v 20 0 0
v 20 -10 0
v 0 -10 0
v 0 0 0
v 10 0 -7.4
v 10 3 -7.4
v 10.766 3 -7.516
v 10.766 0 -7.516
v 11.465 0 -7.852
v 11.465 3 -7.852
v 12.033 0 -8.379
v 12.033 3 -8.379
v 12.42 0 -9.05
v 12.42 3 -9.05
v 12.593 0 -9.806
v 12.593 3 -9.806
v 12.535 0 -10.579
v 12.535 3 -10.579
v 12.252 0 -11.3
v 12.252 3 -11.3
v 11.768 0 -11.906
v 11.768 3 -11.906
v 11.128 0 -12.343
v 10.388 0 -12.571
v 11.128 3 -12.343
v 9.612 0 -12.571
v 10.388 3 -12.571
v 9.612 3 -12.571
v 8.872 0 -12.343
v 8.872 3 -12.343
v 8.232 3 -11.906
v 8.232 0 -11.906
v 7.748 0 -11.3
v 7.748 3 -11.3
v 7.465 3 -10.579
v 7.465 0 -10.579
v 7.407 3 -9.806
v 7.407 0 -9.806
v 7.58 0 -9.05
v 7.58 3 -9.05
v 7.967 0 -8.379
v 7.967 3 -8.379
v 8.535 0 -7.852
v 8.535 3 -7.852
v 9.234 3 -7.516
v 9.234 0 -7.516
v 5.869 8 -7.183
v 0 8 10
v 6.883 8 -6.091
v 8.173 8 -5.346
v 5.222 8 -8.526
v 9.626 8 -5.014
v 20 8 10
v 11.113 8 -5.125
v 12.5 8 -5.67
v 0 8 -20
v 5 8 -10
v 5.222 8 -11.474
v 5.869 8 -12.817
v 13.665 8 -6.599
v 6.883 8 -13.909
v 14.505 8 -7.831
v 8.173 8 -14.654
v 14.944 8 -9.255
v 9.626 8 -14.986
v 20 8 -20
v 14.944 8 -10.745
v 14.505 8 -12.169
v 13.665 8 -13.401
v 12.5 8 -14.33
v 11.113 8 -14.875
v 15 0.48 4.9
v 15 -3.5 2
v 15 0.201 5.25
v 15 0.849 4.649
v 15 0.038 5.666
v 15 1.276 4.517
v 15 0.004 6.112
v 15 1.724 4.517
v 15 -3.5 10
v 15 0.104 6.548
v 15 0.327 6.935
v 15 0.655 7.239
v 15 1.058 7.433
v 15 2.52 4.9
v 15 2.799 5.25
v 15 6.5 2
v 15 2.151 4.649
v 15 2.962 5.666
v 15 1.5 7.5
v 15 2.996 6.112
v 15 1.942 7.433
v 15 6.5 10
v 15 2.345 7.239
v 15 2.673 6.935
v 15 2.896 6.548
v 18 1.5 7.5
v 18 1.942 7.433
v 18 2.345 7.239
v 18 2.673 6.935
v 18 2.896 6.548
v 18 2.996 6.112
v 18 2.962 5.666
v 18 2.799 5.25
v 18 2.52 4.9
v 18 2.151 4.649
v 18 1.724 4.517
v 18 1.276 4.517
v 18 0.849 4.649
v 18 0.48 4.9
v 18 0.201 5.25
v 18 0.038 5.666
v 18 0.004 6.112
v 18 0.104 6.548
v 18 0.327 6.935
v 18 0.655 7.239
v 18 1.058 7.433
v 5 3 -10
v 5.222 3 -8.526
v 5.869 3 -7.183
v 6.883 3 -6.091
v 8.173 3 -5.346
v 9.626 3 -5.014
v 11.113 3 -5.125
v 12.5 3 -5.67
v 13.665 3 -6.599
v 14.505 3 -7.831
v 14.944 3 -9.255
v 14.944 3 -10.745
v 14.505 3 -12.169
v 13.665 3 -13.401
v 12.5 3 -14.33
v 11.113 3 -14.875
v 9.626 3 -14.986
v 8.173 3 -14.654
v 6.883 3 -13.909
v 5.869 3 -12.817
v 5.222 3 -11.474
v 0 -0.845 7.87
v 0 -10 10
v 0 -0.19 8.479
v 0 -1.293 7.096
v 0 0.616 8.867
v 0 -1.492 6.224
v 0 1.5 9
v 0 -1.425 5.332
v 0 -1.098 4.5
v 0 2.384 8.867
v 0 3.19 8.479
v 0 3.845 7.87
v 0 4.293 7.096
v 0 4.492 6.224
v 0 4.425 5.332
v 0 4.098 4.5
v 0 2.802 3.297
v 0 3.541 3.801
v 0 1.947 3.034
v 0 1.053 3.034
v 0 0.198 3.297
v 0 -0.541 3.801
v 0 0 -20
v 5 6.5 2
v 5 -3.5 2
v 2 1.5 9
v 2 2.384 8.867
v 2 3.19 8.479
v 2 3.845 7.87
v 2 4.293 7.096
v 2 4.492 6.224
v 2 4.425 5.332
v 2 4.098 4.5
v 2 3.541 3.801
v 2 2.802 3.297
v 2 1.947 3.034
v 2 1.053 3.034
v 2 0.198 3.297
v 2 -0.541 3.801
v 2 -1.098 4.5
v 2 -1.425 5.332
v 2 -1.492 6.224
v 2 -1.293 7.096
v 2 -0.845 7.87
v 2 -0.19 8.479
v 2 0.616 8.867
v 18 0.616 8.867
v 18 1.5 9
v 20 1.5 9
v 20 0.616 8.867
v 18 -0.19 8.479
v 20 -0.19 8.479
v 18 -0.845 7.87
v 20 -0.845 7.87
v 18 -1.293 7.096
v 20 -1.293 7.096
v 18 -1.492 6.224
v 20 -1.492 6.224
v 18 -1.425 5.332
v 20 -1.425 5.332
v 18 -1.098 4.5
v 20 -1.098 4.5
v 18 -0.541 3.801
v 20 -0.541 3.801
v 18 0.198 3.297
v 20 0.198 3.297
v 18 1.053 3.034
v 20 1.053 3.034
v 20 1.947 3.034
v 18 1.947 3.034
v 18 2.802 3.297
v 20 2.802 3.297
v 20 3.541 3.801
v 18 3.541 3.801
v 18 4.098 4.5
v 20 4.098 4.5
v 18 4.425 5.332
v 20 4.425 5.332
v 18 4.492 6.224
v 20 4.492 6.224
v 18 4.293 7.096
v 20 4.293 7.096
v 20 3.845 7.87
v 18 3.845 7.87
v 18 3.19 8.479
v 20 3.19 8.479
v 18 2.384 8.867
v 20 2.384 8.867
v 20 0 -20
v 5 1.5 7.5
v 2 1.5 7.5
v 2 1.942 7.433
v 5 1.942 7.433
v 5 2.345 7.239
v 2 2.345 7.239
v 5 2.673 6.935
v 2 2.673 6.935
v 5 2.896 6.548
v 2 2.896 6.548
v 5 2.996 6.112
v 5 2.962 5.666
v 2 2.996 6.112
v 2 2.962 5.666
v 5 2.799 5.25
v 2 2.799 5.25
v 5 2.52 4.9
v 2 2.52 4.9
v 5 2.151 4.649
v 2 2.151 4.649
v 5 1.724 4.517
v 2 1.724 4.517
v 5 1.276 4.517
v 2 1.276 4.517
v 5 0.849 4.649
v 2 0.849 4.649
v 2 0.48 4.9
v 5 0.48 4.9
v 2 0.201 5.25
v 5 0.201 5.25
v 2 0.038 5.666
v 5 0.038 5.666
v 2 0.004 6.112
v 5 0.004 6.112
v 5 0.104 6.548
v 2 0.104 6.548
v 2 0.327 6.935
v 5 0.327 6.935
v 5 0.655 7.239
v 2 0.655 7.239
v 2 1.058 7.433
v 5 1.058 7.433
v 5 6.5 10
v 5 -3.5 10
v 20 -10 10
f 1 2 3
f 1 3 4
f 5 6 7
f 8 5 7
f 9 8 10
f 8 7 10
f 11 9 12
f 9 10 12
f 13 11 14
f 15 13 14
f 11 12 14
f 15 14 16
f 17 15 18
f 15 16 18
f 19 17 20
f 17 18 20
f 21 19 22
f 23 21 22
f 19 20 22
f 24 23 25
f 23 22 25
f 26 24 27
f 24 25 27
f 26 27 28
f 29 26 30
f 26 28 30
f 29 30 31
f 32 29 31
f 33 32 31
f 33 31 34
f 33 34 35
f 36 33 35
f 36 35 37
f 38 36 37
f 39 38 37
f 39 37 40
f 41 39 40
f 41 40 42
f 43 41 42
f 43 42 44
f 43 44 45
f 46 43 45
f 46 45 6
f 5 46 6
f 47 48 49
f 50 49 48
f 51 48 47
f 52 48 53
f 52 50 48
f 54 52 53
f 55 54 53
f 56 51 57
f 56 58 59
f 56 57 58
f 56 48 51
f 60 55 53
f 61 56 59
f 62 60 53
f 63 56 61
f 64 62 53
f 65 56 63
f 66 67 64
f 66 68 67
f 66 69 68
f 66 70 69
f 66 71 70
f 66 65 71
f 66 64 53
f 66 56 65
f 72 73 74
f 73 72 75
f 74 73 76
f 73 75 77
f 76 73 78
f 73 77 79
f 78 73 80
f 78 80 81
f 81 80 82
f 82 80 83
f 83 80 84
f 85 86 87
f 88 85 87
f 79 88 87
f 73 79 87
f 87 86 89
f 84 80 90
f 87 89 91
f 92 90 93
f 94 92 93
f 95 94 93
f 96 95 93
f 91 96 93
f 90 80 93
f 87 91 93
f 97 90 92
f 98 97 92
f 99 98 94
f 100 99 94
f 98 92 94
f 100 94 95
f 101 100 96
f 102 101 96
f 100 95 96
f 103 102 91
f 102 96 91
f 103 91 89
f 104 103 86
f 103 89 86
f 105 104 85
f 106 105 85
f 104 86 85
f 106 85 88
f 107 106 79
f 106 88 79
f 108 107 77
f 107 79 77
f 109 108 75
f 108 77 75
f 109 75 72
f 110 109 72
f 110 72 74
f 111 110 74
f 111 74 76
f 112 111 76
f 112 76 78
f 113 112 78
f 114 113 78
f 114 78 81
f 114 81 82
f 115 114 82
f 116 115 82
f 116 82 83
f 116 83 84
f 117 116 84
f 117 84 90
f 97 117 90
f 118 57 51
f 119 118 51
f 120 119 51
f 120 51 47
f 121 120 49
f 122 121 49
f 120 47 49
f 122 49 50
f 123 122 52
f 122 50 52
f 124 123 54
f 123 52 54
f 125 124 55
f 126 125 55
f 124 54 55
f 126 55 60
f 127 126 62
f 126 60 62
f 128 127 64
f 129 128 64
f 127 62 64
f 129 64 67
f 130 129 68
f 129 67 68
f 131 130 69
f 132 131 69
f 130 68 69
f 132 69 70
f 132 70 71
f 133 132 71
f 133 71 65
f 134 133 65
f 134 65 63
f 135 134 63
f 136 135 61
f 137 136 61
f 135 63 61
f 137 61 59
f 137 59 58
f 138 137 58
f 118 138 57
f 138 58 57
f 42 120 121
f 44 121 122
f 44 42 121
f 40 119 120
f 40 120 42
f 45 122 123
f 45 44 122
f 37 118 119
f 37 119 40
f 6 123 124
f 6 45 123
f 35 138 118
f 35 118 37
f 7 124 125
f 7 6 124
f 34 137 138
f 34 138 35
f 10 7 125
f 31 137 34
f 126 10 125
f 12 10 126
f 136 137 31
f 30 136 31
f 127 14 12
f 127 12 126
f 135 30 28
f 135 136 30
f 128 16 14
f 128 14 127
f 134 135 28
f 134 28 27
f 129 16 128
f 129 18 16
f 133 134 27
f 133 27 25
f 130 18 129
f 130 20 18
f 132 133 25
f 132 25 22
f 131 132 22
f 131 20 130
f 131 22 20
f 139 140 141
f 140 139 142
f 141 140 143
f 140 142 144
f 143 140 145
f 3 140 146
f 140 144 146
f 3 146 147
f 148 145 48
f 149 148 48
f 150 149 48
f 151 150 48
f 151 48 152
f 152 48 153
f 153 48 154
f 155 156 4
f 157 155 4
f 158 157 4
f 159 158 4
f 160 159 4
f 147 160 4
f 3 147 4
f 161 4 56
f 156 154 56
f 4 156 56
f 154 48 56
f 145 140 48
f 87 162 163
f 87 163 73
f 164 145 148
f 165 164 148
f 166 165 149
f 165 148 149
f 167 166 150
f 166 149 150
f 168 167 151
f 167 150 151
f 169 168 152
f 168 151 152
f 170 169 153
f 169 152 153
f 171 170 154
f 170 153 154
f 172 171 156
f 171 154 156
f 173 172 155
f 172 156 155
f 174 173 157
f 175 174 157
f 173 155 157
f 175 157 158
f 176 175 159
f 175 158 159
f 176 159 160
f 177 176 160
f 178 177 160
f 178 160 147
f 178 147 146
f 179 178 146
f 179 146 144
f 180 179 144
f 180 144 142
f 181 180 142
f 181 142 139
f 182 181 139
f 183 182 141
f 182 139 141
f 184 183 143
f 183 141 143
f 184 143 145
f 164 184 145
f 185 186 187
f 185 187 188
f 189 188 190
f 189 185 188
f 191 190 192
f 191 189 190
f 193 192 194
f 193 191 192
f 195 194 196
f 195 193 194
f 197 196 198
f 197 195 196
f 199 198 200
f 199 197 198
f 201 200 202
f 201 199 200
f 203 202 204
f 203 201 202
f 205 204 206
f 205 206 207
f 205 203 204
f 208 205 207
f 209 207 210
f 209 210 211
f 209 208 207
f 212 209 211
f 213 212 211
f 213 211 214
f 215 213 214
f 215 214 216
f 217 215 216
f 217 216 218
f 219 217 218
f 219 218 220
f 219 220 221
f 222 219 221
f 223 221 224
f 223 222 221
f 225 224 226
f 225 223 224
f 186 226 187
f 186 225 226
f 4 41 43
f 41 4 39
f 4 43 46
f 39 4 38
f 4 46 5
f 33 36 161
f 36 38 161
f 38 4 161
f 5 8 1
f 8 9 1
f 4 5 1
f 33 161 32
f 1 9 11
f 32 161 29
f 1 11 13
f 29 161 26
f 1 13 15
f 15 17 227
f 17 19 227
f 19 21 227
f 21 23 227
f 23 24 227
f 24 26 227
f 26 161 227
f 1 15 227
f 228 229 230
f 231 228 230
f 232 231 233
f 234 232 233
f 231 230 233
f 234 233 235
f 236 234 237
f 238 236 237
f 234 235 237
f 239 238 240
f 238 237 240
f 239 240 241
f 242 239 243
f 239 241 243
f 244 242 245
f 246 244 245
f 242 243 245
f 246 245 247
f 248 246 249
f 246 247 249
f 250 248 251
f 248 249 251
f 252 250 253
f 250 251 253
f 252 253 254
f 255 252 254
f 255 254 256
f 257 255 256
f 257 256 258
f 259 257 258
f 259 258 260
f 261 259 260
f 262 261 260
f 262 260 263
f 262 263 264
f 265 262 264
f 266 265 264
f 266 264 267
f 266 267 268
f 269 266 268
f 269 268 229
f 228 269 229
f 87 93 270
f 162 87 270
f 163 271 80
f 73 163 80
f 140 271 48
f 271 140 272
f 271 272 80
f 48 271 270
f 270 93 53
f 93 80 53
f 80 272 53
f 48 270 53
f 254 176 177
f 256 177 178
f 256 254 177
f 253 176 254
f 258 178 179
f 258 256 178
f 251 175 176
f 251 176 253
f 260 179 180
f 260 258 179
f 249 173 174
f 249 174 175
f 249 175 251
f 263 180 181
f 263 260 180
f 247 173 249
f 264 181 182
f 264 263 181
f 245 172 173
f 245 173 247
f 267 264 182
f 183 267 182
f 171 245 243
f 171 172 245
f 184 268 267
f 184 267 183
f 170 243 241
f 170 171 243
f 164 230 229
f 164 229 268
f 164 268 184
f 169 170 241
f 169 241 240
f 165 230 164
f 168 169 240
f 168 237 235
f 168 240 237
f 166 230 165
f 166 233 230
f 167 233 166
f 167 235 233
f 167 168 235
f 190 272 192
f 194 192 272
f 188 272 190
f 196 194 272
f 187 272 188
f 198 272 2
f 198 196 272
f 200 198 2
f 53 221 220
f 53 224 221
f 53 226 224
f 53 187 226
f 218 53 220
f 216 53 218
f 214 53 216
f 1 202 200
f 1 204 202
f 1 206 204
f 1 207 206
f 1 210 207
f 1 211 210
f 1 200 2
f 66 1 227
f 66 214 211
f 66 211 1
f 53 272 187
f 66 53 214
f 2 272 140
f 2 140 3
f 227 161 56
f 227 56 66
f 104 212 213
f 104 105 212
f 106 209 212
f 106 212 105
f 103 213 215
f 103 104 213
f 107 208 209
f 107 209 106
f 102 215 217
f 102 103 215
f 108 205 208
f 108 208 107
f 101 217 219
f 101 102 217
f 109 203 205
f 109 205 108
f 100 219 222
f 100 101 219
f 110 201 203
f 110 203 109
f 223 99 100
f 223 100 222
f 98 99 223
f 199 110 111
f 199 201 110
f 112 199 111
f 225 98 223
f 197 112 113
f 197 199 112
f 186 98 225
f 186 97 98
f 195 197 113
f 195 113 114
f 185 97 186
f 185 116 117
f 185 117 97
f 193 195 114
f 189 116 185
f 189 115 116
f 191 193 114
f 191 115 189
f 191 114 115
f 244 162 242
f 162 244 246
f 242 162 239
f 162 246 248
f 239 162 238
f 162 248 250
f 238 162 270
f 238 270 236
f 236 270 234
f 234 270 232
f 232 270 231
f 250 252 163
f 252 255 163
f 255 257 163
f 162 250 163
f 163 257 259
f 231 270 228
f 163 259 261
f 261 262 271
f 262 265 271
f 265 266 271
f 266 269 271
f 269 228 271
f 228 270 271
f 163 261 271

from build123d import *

# Parameters (mm, degrees)
SKETCH_1_W          = 20
SKETCH_1_H          = 20
EXTRUDE_1_DEPTH     = 8
EXTRUDE_2_DEPTH     = 20
SKETCH_3_W          = 4
SKETCH_3_H          = 13
EXTRUDE_3_DEPTH     = 20
CUT_EXTRUDE_1_DEPTH = 5
SKETCH_5_R          = 2.6
CUT_EXTRUDE_2_DEPTH = 13
EXTRUDE_4_DEPTH     = 20
SKETCH_9_W          = 20
SKETCH_9_H          = 13
SKETCH_9_W_2        = 10
SKETCH_9_H_2        = 10
EXTRUDE_5_DEPTH     = 26
SKETCH_10_W         = 10
SKETCH_10_H         = 10
CUT_EXTRUDE_3_DEPTH = 14
SKETCH_13_W         = 20
SKETCH_13_H         = 13
CUT_EXTRUDE_4_DEPTH = 20
SKETCH_14_W         = 5
SKETCH_14_H         = 5
CUT_EXTRUDE_5_DEPTH = 8
CUT_EXTRUDE_6_DEPTH = 20
SKETCH_16_R         = 3
CUT_EXTRUDE_7_DEPTH = 2
CUT_EXTRUDE_START   = -2
SKETCH_17_R         = 3
CUT_EXTRUDE_8_DEPTH = 2
SKETCH_18_W         = 20
SKETCH_18_H         = 4
CUT_EXTRUDE_9_DEPTH = 20
SKETCH_19_W         = 10
SKETCH_19_H         = 5
EXTRUDE_6_DEPTH     = 20


with BuildPart() as part:
    # 草图1 → 凸台-拉伸1 (new body)
    with BuildSketch(Plane(origin=(0, 0, 0), x_dir=(1, 0, 0), z_dir=(0, 1, 0))):
        with Locations((10, 10)):
            Rectangle(SKETCH_1_W, SKETCH_1_H)
    extrude(amount=EXTRUDE_1_DEPTH)

    # 草图2 → 凸台-拉伸2 (add)
    with BuildSketch(Plane.ZY):
        Polygon((-24, 0), (-24, -5), (-20, -5), (-20, 0), (-20, 8), (-24, 8), align=None)
    extrude(amount=-EXTRUDE_2_DEPTH)

    # 草图3 → 凸台-拉伸3 (add)
    with BuildSketch(Plane.ZY):
        with Locations((2, 1.5)):
            Rectangle(SKETCH_3_W, SKETCH_3_H)
    extrude(amount=-EXTRUDE_3_DEPTH)

    # 草图4 → 切除-拉伸1 (cut)
    with BuildSketch(Plane(origin=(0, 8, 0), x_dir=(1, 0, 0), z_dir=(0, 1, 0))):
        with BuildLine():
            ThreePointArc((15, 10), (10, 15), (5, 10))
            Line((5, 10), (15, 10))
        make_face()
        with BuildLine():
            Line((15, 10), (5, 10))
            ThreePointArc((5, 10), (10, 5), (15, 10))
        make_face()
        with BuildLine():
            ThreePointArc((15, 10), (10, 15), (5, 10))
            Line((5, 10), (15, 10))
        make_face()
        with BuildLine():
            Line((15, 10), (5, 10))
            ThreePointArc((5, 10), (10, 5), (15, 10))
        make_face()
    extrude(amount=-CUT_EXTRUDE_1_DEPTH, mode=Mode.SUBTRACT)

    # 草图5 → 切除-拉伸2 (cut)
    with BuildSketch(Plane(origin=(0, 8, 0), x_dir=(1, 0, 0), z_dir=(0, 1, 0))):
        with Locations(Location((10, 10, 0), (0, 0, 270))):
            Circle(SKETCH_5_R)
    extrude(amount=-CUT_EXTRUDE_2_DEPTH, mode=Mode.SUBTRACT)

    # 草图8 → 凸台-拉伸4 (add)
    with BuildSketch(Plane.XY.offset(4)):
        Polygon((10, 6.5), (15, 6.5), (15, 1.5), (15, -3.5), (10, -3.5), (5, -3.5), (5, 1.5), (5, 6.5), align=None)
    extrude(amount=EXTRUDE_4_DEPTH)

    # 草图9 → 凸台-拉伸5 (add)
    with BuildSketch(Plane.XY.offset(4)):
        with Locations((10, 1.5)):
            Rectangle(SKETCH_9_W, SKETCH_9_H)
        with Locations((10, 1.5)):
            Rectangle(SKETCH_9_W_2, SKETCH_9_H_2, mode=Mode.SUBTRACT)
    extrude(amount=EXTRUDE_5_DEPTH)

    # 草图10 → 切除-拉伸3 (cut)
    with BuildSketch(Plane.XY.offset(24)):
        with Locations((10, 1.5)):
            Rectangle(SKETCH_10_W, SKETCH_10_H)
    extrude(amount=-CUT_EXTRUDE_3_DEPTH, mode=Mode.SUBTRACT)

    # 草图13 → 切除-拉伸4 (cut)
    with BuildSketch(Plane.ZY):
        with Locations((20, 1.5)):
            Rectangle(SKETCH_13_W, SKETCH_13_H)
    extrude(amount=-CUT_EXTRUDE_4_DEPTH, mode=Mode.SUBTRACT)

    # 草图14 → 切除-拉伸5 (cut)
    with BuildSketch(Plane.XY.offset(10)):
        with Locations((7.5, 4)):
            Rectangle(SKETCH_14_W, SKETCH_14_H)
        with Locations((12.5, 4)):
            Rectangle(SKETCH_14_W, SKETCH_14_H)
        with Locations((7.5, -1)):
            Rectangle(SKETCH_14_W, SKETCH_14_H)
        with Locations((12.5, -1)):
            Rectangle(SKETCH_14_W, SKETCH_14_H)
    extrude(amount=-CUT_EXTRUDE_5_DEPTH, mode=Mode.SUBTRACT)

    # 草图15 → 切除-拉伸6 (cut)
    with BuildSketch(Plane.ZY):
        with BuildLine():
            ThreePointArc((4.5, 1.5), (6, 0), (7.5, 1.5))
            Line((7.5, 1.5), (4.5, 1.5))
        make_face()
        with BuildLine():
            Line((4.5, 1.5), (7.5, 1.5))
            ThreePointArc((7.5, 1.5), (6, 3), (4.5, 1.5))
        make_face()
        with BuildLine():
            ThreePointArc((4.5, 1.5), (6, 0), (7.5, 1.5))
            Line((7.5, 1.5), (4.5, 1.5))
        make_face()
        with BuildLine():
            Line((4.5, 1.5), (7.5, 1.5))
            ThreePointArc((7.5, 1.5), (6, 3), (4.5, 1.5))
        make_face()
    extrude(amount=-CUT_EXTRUDE_6_DEPTH, mode=Mode.SUBTRACT)

    # 草图16 → 切除-拉伸7 (cut)
    with BuildSketch(Plane.ZY):
        with Locations((6, 1.5)):
            Circle(SKETCH_16_R)
    extrude(amount=-CUT_EXTRUDE_7_DEPTH, mode=Mode.SUBTRACT)

    # 草图17 → 切除-拉伸8 (cut)
    with BuildSketch(Plane(origin=(20, 0, 0), x_dir=(0, 0, -1), z_dir=(1, 0, 0)).offset(CUT_EXTRUDE_START)):
        with Locations(Location((-6, 1.5, 0), (0, 0, 180))):
            Circle(SKETCH_17_R)
    extrude(amount=CUT_EXTRUDE_8_DEPTH, mode=Mode.SUBTRACT)

    # 草图18 → 切除-拉伸9 (cut)
    with BuildSketch(Plane.XZ.offset(5)):
        with Locations((10, -22)):
            Rectangle(SKETCH_18_W, SKETCH_18_H)
    extrude(amount=-CUT_EXTRUDE_9_DEPTH, mode=Mode.SUBTRACT)

    # 草图19 → 凸台-拉伸6 (add)
    with BuildSketch(Plane(origin=(20, 0, 0), x_dir=(0, 0, -1), z_dir=(1, 0, 0))):
        with Locations((-5, -7.5)):
            Rectangle(SKETCH_19_W, SKETCH_19_H)
    extrude(amount=-EXTRUDE_6_DEPTH)


solid = part.part
